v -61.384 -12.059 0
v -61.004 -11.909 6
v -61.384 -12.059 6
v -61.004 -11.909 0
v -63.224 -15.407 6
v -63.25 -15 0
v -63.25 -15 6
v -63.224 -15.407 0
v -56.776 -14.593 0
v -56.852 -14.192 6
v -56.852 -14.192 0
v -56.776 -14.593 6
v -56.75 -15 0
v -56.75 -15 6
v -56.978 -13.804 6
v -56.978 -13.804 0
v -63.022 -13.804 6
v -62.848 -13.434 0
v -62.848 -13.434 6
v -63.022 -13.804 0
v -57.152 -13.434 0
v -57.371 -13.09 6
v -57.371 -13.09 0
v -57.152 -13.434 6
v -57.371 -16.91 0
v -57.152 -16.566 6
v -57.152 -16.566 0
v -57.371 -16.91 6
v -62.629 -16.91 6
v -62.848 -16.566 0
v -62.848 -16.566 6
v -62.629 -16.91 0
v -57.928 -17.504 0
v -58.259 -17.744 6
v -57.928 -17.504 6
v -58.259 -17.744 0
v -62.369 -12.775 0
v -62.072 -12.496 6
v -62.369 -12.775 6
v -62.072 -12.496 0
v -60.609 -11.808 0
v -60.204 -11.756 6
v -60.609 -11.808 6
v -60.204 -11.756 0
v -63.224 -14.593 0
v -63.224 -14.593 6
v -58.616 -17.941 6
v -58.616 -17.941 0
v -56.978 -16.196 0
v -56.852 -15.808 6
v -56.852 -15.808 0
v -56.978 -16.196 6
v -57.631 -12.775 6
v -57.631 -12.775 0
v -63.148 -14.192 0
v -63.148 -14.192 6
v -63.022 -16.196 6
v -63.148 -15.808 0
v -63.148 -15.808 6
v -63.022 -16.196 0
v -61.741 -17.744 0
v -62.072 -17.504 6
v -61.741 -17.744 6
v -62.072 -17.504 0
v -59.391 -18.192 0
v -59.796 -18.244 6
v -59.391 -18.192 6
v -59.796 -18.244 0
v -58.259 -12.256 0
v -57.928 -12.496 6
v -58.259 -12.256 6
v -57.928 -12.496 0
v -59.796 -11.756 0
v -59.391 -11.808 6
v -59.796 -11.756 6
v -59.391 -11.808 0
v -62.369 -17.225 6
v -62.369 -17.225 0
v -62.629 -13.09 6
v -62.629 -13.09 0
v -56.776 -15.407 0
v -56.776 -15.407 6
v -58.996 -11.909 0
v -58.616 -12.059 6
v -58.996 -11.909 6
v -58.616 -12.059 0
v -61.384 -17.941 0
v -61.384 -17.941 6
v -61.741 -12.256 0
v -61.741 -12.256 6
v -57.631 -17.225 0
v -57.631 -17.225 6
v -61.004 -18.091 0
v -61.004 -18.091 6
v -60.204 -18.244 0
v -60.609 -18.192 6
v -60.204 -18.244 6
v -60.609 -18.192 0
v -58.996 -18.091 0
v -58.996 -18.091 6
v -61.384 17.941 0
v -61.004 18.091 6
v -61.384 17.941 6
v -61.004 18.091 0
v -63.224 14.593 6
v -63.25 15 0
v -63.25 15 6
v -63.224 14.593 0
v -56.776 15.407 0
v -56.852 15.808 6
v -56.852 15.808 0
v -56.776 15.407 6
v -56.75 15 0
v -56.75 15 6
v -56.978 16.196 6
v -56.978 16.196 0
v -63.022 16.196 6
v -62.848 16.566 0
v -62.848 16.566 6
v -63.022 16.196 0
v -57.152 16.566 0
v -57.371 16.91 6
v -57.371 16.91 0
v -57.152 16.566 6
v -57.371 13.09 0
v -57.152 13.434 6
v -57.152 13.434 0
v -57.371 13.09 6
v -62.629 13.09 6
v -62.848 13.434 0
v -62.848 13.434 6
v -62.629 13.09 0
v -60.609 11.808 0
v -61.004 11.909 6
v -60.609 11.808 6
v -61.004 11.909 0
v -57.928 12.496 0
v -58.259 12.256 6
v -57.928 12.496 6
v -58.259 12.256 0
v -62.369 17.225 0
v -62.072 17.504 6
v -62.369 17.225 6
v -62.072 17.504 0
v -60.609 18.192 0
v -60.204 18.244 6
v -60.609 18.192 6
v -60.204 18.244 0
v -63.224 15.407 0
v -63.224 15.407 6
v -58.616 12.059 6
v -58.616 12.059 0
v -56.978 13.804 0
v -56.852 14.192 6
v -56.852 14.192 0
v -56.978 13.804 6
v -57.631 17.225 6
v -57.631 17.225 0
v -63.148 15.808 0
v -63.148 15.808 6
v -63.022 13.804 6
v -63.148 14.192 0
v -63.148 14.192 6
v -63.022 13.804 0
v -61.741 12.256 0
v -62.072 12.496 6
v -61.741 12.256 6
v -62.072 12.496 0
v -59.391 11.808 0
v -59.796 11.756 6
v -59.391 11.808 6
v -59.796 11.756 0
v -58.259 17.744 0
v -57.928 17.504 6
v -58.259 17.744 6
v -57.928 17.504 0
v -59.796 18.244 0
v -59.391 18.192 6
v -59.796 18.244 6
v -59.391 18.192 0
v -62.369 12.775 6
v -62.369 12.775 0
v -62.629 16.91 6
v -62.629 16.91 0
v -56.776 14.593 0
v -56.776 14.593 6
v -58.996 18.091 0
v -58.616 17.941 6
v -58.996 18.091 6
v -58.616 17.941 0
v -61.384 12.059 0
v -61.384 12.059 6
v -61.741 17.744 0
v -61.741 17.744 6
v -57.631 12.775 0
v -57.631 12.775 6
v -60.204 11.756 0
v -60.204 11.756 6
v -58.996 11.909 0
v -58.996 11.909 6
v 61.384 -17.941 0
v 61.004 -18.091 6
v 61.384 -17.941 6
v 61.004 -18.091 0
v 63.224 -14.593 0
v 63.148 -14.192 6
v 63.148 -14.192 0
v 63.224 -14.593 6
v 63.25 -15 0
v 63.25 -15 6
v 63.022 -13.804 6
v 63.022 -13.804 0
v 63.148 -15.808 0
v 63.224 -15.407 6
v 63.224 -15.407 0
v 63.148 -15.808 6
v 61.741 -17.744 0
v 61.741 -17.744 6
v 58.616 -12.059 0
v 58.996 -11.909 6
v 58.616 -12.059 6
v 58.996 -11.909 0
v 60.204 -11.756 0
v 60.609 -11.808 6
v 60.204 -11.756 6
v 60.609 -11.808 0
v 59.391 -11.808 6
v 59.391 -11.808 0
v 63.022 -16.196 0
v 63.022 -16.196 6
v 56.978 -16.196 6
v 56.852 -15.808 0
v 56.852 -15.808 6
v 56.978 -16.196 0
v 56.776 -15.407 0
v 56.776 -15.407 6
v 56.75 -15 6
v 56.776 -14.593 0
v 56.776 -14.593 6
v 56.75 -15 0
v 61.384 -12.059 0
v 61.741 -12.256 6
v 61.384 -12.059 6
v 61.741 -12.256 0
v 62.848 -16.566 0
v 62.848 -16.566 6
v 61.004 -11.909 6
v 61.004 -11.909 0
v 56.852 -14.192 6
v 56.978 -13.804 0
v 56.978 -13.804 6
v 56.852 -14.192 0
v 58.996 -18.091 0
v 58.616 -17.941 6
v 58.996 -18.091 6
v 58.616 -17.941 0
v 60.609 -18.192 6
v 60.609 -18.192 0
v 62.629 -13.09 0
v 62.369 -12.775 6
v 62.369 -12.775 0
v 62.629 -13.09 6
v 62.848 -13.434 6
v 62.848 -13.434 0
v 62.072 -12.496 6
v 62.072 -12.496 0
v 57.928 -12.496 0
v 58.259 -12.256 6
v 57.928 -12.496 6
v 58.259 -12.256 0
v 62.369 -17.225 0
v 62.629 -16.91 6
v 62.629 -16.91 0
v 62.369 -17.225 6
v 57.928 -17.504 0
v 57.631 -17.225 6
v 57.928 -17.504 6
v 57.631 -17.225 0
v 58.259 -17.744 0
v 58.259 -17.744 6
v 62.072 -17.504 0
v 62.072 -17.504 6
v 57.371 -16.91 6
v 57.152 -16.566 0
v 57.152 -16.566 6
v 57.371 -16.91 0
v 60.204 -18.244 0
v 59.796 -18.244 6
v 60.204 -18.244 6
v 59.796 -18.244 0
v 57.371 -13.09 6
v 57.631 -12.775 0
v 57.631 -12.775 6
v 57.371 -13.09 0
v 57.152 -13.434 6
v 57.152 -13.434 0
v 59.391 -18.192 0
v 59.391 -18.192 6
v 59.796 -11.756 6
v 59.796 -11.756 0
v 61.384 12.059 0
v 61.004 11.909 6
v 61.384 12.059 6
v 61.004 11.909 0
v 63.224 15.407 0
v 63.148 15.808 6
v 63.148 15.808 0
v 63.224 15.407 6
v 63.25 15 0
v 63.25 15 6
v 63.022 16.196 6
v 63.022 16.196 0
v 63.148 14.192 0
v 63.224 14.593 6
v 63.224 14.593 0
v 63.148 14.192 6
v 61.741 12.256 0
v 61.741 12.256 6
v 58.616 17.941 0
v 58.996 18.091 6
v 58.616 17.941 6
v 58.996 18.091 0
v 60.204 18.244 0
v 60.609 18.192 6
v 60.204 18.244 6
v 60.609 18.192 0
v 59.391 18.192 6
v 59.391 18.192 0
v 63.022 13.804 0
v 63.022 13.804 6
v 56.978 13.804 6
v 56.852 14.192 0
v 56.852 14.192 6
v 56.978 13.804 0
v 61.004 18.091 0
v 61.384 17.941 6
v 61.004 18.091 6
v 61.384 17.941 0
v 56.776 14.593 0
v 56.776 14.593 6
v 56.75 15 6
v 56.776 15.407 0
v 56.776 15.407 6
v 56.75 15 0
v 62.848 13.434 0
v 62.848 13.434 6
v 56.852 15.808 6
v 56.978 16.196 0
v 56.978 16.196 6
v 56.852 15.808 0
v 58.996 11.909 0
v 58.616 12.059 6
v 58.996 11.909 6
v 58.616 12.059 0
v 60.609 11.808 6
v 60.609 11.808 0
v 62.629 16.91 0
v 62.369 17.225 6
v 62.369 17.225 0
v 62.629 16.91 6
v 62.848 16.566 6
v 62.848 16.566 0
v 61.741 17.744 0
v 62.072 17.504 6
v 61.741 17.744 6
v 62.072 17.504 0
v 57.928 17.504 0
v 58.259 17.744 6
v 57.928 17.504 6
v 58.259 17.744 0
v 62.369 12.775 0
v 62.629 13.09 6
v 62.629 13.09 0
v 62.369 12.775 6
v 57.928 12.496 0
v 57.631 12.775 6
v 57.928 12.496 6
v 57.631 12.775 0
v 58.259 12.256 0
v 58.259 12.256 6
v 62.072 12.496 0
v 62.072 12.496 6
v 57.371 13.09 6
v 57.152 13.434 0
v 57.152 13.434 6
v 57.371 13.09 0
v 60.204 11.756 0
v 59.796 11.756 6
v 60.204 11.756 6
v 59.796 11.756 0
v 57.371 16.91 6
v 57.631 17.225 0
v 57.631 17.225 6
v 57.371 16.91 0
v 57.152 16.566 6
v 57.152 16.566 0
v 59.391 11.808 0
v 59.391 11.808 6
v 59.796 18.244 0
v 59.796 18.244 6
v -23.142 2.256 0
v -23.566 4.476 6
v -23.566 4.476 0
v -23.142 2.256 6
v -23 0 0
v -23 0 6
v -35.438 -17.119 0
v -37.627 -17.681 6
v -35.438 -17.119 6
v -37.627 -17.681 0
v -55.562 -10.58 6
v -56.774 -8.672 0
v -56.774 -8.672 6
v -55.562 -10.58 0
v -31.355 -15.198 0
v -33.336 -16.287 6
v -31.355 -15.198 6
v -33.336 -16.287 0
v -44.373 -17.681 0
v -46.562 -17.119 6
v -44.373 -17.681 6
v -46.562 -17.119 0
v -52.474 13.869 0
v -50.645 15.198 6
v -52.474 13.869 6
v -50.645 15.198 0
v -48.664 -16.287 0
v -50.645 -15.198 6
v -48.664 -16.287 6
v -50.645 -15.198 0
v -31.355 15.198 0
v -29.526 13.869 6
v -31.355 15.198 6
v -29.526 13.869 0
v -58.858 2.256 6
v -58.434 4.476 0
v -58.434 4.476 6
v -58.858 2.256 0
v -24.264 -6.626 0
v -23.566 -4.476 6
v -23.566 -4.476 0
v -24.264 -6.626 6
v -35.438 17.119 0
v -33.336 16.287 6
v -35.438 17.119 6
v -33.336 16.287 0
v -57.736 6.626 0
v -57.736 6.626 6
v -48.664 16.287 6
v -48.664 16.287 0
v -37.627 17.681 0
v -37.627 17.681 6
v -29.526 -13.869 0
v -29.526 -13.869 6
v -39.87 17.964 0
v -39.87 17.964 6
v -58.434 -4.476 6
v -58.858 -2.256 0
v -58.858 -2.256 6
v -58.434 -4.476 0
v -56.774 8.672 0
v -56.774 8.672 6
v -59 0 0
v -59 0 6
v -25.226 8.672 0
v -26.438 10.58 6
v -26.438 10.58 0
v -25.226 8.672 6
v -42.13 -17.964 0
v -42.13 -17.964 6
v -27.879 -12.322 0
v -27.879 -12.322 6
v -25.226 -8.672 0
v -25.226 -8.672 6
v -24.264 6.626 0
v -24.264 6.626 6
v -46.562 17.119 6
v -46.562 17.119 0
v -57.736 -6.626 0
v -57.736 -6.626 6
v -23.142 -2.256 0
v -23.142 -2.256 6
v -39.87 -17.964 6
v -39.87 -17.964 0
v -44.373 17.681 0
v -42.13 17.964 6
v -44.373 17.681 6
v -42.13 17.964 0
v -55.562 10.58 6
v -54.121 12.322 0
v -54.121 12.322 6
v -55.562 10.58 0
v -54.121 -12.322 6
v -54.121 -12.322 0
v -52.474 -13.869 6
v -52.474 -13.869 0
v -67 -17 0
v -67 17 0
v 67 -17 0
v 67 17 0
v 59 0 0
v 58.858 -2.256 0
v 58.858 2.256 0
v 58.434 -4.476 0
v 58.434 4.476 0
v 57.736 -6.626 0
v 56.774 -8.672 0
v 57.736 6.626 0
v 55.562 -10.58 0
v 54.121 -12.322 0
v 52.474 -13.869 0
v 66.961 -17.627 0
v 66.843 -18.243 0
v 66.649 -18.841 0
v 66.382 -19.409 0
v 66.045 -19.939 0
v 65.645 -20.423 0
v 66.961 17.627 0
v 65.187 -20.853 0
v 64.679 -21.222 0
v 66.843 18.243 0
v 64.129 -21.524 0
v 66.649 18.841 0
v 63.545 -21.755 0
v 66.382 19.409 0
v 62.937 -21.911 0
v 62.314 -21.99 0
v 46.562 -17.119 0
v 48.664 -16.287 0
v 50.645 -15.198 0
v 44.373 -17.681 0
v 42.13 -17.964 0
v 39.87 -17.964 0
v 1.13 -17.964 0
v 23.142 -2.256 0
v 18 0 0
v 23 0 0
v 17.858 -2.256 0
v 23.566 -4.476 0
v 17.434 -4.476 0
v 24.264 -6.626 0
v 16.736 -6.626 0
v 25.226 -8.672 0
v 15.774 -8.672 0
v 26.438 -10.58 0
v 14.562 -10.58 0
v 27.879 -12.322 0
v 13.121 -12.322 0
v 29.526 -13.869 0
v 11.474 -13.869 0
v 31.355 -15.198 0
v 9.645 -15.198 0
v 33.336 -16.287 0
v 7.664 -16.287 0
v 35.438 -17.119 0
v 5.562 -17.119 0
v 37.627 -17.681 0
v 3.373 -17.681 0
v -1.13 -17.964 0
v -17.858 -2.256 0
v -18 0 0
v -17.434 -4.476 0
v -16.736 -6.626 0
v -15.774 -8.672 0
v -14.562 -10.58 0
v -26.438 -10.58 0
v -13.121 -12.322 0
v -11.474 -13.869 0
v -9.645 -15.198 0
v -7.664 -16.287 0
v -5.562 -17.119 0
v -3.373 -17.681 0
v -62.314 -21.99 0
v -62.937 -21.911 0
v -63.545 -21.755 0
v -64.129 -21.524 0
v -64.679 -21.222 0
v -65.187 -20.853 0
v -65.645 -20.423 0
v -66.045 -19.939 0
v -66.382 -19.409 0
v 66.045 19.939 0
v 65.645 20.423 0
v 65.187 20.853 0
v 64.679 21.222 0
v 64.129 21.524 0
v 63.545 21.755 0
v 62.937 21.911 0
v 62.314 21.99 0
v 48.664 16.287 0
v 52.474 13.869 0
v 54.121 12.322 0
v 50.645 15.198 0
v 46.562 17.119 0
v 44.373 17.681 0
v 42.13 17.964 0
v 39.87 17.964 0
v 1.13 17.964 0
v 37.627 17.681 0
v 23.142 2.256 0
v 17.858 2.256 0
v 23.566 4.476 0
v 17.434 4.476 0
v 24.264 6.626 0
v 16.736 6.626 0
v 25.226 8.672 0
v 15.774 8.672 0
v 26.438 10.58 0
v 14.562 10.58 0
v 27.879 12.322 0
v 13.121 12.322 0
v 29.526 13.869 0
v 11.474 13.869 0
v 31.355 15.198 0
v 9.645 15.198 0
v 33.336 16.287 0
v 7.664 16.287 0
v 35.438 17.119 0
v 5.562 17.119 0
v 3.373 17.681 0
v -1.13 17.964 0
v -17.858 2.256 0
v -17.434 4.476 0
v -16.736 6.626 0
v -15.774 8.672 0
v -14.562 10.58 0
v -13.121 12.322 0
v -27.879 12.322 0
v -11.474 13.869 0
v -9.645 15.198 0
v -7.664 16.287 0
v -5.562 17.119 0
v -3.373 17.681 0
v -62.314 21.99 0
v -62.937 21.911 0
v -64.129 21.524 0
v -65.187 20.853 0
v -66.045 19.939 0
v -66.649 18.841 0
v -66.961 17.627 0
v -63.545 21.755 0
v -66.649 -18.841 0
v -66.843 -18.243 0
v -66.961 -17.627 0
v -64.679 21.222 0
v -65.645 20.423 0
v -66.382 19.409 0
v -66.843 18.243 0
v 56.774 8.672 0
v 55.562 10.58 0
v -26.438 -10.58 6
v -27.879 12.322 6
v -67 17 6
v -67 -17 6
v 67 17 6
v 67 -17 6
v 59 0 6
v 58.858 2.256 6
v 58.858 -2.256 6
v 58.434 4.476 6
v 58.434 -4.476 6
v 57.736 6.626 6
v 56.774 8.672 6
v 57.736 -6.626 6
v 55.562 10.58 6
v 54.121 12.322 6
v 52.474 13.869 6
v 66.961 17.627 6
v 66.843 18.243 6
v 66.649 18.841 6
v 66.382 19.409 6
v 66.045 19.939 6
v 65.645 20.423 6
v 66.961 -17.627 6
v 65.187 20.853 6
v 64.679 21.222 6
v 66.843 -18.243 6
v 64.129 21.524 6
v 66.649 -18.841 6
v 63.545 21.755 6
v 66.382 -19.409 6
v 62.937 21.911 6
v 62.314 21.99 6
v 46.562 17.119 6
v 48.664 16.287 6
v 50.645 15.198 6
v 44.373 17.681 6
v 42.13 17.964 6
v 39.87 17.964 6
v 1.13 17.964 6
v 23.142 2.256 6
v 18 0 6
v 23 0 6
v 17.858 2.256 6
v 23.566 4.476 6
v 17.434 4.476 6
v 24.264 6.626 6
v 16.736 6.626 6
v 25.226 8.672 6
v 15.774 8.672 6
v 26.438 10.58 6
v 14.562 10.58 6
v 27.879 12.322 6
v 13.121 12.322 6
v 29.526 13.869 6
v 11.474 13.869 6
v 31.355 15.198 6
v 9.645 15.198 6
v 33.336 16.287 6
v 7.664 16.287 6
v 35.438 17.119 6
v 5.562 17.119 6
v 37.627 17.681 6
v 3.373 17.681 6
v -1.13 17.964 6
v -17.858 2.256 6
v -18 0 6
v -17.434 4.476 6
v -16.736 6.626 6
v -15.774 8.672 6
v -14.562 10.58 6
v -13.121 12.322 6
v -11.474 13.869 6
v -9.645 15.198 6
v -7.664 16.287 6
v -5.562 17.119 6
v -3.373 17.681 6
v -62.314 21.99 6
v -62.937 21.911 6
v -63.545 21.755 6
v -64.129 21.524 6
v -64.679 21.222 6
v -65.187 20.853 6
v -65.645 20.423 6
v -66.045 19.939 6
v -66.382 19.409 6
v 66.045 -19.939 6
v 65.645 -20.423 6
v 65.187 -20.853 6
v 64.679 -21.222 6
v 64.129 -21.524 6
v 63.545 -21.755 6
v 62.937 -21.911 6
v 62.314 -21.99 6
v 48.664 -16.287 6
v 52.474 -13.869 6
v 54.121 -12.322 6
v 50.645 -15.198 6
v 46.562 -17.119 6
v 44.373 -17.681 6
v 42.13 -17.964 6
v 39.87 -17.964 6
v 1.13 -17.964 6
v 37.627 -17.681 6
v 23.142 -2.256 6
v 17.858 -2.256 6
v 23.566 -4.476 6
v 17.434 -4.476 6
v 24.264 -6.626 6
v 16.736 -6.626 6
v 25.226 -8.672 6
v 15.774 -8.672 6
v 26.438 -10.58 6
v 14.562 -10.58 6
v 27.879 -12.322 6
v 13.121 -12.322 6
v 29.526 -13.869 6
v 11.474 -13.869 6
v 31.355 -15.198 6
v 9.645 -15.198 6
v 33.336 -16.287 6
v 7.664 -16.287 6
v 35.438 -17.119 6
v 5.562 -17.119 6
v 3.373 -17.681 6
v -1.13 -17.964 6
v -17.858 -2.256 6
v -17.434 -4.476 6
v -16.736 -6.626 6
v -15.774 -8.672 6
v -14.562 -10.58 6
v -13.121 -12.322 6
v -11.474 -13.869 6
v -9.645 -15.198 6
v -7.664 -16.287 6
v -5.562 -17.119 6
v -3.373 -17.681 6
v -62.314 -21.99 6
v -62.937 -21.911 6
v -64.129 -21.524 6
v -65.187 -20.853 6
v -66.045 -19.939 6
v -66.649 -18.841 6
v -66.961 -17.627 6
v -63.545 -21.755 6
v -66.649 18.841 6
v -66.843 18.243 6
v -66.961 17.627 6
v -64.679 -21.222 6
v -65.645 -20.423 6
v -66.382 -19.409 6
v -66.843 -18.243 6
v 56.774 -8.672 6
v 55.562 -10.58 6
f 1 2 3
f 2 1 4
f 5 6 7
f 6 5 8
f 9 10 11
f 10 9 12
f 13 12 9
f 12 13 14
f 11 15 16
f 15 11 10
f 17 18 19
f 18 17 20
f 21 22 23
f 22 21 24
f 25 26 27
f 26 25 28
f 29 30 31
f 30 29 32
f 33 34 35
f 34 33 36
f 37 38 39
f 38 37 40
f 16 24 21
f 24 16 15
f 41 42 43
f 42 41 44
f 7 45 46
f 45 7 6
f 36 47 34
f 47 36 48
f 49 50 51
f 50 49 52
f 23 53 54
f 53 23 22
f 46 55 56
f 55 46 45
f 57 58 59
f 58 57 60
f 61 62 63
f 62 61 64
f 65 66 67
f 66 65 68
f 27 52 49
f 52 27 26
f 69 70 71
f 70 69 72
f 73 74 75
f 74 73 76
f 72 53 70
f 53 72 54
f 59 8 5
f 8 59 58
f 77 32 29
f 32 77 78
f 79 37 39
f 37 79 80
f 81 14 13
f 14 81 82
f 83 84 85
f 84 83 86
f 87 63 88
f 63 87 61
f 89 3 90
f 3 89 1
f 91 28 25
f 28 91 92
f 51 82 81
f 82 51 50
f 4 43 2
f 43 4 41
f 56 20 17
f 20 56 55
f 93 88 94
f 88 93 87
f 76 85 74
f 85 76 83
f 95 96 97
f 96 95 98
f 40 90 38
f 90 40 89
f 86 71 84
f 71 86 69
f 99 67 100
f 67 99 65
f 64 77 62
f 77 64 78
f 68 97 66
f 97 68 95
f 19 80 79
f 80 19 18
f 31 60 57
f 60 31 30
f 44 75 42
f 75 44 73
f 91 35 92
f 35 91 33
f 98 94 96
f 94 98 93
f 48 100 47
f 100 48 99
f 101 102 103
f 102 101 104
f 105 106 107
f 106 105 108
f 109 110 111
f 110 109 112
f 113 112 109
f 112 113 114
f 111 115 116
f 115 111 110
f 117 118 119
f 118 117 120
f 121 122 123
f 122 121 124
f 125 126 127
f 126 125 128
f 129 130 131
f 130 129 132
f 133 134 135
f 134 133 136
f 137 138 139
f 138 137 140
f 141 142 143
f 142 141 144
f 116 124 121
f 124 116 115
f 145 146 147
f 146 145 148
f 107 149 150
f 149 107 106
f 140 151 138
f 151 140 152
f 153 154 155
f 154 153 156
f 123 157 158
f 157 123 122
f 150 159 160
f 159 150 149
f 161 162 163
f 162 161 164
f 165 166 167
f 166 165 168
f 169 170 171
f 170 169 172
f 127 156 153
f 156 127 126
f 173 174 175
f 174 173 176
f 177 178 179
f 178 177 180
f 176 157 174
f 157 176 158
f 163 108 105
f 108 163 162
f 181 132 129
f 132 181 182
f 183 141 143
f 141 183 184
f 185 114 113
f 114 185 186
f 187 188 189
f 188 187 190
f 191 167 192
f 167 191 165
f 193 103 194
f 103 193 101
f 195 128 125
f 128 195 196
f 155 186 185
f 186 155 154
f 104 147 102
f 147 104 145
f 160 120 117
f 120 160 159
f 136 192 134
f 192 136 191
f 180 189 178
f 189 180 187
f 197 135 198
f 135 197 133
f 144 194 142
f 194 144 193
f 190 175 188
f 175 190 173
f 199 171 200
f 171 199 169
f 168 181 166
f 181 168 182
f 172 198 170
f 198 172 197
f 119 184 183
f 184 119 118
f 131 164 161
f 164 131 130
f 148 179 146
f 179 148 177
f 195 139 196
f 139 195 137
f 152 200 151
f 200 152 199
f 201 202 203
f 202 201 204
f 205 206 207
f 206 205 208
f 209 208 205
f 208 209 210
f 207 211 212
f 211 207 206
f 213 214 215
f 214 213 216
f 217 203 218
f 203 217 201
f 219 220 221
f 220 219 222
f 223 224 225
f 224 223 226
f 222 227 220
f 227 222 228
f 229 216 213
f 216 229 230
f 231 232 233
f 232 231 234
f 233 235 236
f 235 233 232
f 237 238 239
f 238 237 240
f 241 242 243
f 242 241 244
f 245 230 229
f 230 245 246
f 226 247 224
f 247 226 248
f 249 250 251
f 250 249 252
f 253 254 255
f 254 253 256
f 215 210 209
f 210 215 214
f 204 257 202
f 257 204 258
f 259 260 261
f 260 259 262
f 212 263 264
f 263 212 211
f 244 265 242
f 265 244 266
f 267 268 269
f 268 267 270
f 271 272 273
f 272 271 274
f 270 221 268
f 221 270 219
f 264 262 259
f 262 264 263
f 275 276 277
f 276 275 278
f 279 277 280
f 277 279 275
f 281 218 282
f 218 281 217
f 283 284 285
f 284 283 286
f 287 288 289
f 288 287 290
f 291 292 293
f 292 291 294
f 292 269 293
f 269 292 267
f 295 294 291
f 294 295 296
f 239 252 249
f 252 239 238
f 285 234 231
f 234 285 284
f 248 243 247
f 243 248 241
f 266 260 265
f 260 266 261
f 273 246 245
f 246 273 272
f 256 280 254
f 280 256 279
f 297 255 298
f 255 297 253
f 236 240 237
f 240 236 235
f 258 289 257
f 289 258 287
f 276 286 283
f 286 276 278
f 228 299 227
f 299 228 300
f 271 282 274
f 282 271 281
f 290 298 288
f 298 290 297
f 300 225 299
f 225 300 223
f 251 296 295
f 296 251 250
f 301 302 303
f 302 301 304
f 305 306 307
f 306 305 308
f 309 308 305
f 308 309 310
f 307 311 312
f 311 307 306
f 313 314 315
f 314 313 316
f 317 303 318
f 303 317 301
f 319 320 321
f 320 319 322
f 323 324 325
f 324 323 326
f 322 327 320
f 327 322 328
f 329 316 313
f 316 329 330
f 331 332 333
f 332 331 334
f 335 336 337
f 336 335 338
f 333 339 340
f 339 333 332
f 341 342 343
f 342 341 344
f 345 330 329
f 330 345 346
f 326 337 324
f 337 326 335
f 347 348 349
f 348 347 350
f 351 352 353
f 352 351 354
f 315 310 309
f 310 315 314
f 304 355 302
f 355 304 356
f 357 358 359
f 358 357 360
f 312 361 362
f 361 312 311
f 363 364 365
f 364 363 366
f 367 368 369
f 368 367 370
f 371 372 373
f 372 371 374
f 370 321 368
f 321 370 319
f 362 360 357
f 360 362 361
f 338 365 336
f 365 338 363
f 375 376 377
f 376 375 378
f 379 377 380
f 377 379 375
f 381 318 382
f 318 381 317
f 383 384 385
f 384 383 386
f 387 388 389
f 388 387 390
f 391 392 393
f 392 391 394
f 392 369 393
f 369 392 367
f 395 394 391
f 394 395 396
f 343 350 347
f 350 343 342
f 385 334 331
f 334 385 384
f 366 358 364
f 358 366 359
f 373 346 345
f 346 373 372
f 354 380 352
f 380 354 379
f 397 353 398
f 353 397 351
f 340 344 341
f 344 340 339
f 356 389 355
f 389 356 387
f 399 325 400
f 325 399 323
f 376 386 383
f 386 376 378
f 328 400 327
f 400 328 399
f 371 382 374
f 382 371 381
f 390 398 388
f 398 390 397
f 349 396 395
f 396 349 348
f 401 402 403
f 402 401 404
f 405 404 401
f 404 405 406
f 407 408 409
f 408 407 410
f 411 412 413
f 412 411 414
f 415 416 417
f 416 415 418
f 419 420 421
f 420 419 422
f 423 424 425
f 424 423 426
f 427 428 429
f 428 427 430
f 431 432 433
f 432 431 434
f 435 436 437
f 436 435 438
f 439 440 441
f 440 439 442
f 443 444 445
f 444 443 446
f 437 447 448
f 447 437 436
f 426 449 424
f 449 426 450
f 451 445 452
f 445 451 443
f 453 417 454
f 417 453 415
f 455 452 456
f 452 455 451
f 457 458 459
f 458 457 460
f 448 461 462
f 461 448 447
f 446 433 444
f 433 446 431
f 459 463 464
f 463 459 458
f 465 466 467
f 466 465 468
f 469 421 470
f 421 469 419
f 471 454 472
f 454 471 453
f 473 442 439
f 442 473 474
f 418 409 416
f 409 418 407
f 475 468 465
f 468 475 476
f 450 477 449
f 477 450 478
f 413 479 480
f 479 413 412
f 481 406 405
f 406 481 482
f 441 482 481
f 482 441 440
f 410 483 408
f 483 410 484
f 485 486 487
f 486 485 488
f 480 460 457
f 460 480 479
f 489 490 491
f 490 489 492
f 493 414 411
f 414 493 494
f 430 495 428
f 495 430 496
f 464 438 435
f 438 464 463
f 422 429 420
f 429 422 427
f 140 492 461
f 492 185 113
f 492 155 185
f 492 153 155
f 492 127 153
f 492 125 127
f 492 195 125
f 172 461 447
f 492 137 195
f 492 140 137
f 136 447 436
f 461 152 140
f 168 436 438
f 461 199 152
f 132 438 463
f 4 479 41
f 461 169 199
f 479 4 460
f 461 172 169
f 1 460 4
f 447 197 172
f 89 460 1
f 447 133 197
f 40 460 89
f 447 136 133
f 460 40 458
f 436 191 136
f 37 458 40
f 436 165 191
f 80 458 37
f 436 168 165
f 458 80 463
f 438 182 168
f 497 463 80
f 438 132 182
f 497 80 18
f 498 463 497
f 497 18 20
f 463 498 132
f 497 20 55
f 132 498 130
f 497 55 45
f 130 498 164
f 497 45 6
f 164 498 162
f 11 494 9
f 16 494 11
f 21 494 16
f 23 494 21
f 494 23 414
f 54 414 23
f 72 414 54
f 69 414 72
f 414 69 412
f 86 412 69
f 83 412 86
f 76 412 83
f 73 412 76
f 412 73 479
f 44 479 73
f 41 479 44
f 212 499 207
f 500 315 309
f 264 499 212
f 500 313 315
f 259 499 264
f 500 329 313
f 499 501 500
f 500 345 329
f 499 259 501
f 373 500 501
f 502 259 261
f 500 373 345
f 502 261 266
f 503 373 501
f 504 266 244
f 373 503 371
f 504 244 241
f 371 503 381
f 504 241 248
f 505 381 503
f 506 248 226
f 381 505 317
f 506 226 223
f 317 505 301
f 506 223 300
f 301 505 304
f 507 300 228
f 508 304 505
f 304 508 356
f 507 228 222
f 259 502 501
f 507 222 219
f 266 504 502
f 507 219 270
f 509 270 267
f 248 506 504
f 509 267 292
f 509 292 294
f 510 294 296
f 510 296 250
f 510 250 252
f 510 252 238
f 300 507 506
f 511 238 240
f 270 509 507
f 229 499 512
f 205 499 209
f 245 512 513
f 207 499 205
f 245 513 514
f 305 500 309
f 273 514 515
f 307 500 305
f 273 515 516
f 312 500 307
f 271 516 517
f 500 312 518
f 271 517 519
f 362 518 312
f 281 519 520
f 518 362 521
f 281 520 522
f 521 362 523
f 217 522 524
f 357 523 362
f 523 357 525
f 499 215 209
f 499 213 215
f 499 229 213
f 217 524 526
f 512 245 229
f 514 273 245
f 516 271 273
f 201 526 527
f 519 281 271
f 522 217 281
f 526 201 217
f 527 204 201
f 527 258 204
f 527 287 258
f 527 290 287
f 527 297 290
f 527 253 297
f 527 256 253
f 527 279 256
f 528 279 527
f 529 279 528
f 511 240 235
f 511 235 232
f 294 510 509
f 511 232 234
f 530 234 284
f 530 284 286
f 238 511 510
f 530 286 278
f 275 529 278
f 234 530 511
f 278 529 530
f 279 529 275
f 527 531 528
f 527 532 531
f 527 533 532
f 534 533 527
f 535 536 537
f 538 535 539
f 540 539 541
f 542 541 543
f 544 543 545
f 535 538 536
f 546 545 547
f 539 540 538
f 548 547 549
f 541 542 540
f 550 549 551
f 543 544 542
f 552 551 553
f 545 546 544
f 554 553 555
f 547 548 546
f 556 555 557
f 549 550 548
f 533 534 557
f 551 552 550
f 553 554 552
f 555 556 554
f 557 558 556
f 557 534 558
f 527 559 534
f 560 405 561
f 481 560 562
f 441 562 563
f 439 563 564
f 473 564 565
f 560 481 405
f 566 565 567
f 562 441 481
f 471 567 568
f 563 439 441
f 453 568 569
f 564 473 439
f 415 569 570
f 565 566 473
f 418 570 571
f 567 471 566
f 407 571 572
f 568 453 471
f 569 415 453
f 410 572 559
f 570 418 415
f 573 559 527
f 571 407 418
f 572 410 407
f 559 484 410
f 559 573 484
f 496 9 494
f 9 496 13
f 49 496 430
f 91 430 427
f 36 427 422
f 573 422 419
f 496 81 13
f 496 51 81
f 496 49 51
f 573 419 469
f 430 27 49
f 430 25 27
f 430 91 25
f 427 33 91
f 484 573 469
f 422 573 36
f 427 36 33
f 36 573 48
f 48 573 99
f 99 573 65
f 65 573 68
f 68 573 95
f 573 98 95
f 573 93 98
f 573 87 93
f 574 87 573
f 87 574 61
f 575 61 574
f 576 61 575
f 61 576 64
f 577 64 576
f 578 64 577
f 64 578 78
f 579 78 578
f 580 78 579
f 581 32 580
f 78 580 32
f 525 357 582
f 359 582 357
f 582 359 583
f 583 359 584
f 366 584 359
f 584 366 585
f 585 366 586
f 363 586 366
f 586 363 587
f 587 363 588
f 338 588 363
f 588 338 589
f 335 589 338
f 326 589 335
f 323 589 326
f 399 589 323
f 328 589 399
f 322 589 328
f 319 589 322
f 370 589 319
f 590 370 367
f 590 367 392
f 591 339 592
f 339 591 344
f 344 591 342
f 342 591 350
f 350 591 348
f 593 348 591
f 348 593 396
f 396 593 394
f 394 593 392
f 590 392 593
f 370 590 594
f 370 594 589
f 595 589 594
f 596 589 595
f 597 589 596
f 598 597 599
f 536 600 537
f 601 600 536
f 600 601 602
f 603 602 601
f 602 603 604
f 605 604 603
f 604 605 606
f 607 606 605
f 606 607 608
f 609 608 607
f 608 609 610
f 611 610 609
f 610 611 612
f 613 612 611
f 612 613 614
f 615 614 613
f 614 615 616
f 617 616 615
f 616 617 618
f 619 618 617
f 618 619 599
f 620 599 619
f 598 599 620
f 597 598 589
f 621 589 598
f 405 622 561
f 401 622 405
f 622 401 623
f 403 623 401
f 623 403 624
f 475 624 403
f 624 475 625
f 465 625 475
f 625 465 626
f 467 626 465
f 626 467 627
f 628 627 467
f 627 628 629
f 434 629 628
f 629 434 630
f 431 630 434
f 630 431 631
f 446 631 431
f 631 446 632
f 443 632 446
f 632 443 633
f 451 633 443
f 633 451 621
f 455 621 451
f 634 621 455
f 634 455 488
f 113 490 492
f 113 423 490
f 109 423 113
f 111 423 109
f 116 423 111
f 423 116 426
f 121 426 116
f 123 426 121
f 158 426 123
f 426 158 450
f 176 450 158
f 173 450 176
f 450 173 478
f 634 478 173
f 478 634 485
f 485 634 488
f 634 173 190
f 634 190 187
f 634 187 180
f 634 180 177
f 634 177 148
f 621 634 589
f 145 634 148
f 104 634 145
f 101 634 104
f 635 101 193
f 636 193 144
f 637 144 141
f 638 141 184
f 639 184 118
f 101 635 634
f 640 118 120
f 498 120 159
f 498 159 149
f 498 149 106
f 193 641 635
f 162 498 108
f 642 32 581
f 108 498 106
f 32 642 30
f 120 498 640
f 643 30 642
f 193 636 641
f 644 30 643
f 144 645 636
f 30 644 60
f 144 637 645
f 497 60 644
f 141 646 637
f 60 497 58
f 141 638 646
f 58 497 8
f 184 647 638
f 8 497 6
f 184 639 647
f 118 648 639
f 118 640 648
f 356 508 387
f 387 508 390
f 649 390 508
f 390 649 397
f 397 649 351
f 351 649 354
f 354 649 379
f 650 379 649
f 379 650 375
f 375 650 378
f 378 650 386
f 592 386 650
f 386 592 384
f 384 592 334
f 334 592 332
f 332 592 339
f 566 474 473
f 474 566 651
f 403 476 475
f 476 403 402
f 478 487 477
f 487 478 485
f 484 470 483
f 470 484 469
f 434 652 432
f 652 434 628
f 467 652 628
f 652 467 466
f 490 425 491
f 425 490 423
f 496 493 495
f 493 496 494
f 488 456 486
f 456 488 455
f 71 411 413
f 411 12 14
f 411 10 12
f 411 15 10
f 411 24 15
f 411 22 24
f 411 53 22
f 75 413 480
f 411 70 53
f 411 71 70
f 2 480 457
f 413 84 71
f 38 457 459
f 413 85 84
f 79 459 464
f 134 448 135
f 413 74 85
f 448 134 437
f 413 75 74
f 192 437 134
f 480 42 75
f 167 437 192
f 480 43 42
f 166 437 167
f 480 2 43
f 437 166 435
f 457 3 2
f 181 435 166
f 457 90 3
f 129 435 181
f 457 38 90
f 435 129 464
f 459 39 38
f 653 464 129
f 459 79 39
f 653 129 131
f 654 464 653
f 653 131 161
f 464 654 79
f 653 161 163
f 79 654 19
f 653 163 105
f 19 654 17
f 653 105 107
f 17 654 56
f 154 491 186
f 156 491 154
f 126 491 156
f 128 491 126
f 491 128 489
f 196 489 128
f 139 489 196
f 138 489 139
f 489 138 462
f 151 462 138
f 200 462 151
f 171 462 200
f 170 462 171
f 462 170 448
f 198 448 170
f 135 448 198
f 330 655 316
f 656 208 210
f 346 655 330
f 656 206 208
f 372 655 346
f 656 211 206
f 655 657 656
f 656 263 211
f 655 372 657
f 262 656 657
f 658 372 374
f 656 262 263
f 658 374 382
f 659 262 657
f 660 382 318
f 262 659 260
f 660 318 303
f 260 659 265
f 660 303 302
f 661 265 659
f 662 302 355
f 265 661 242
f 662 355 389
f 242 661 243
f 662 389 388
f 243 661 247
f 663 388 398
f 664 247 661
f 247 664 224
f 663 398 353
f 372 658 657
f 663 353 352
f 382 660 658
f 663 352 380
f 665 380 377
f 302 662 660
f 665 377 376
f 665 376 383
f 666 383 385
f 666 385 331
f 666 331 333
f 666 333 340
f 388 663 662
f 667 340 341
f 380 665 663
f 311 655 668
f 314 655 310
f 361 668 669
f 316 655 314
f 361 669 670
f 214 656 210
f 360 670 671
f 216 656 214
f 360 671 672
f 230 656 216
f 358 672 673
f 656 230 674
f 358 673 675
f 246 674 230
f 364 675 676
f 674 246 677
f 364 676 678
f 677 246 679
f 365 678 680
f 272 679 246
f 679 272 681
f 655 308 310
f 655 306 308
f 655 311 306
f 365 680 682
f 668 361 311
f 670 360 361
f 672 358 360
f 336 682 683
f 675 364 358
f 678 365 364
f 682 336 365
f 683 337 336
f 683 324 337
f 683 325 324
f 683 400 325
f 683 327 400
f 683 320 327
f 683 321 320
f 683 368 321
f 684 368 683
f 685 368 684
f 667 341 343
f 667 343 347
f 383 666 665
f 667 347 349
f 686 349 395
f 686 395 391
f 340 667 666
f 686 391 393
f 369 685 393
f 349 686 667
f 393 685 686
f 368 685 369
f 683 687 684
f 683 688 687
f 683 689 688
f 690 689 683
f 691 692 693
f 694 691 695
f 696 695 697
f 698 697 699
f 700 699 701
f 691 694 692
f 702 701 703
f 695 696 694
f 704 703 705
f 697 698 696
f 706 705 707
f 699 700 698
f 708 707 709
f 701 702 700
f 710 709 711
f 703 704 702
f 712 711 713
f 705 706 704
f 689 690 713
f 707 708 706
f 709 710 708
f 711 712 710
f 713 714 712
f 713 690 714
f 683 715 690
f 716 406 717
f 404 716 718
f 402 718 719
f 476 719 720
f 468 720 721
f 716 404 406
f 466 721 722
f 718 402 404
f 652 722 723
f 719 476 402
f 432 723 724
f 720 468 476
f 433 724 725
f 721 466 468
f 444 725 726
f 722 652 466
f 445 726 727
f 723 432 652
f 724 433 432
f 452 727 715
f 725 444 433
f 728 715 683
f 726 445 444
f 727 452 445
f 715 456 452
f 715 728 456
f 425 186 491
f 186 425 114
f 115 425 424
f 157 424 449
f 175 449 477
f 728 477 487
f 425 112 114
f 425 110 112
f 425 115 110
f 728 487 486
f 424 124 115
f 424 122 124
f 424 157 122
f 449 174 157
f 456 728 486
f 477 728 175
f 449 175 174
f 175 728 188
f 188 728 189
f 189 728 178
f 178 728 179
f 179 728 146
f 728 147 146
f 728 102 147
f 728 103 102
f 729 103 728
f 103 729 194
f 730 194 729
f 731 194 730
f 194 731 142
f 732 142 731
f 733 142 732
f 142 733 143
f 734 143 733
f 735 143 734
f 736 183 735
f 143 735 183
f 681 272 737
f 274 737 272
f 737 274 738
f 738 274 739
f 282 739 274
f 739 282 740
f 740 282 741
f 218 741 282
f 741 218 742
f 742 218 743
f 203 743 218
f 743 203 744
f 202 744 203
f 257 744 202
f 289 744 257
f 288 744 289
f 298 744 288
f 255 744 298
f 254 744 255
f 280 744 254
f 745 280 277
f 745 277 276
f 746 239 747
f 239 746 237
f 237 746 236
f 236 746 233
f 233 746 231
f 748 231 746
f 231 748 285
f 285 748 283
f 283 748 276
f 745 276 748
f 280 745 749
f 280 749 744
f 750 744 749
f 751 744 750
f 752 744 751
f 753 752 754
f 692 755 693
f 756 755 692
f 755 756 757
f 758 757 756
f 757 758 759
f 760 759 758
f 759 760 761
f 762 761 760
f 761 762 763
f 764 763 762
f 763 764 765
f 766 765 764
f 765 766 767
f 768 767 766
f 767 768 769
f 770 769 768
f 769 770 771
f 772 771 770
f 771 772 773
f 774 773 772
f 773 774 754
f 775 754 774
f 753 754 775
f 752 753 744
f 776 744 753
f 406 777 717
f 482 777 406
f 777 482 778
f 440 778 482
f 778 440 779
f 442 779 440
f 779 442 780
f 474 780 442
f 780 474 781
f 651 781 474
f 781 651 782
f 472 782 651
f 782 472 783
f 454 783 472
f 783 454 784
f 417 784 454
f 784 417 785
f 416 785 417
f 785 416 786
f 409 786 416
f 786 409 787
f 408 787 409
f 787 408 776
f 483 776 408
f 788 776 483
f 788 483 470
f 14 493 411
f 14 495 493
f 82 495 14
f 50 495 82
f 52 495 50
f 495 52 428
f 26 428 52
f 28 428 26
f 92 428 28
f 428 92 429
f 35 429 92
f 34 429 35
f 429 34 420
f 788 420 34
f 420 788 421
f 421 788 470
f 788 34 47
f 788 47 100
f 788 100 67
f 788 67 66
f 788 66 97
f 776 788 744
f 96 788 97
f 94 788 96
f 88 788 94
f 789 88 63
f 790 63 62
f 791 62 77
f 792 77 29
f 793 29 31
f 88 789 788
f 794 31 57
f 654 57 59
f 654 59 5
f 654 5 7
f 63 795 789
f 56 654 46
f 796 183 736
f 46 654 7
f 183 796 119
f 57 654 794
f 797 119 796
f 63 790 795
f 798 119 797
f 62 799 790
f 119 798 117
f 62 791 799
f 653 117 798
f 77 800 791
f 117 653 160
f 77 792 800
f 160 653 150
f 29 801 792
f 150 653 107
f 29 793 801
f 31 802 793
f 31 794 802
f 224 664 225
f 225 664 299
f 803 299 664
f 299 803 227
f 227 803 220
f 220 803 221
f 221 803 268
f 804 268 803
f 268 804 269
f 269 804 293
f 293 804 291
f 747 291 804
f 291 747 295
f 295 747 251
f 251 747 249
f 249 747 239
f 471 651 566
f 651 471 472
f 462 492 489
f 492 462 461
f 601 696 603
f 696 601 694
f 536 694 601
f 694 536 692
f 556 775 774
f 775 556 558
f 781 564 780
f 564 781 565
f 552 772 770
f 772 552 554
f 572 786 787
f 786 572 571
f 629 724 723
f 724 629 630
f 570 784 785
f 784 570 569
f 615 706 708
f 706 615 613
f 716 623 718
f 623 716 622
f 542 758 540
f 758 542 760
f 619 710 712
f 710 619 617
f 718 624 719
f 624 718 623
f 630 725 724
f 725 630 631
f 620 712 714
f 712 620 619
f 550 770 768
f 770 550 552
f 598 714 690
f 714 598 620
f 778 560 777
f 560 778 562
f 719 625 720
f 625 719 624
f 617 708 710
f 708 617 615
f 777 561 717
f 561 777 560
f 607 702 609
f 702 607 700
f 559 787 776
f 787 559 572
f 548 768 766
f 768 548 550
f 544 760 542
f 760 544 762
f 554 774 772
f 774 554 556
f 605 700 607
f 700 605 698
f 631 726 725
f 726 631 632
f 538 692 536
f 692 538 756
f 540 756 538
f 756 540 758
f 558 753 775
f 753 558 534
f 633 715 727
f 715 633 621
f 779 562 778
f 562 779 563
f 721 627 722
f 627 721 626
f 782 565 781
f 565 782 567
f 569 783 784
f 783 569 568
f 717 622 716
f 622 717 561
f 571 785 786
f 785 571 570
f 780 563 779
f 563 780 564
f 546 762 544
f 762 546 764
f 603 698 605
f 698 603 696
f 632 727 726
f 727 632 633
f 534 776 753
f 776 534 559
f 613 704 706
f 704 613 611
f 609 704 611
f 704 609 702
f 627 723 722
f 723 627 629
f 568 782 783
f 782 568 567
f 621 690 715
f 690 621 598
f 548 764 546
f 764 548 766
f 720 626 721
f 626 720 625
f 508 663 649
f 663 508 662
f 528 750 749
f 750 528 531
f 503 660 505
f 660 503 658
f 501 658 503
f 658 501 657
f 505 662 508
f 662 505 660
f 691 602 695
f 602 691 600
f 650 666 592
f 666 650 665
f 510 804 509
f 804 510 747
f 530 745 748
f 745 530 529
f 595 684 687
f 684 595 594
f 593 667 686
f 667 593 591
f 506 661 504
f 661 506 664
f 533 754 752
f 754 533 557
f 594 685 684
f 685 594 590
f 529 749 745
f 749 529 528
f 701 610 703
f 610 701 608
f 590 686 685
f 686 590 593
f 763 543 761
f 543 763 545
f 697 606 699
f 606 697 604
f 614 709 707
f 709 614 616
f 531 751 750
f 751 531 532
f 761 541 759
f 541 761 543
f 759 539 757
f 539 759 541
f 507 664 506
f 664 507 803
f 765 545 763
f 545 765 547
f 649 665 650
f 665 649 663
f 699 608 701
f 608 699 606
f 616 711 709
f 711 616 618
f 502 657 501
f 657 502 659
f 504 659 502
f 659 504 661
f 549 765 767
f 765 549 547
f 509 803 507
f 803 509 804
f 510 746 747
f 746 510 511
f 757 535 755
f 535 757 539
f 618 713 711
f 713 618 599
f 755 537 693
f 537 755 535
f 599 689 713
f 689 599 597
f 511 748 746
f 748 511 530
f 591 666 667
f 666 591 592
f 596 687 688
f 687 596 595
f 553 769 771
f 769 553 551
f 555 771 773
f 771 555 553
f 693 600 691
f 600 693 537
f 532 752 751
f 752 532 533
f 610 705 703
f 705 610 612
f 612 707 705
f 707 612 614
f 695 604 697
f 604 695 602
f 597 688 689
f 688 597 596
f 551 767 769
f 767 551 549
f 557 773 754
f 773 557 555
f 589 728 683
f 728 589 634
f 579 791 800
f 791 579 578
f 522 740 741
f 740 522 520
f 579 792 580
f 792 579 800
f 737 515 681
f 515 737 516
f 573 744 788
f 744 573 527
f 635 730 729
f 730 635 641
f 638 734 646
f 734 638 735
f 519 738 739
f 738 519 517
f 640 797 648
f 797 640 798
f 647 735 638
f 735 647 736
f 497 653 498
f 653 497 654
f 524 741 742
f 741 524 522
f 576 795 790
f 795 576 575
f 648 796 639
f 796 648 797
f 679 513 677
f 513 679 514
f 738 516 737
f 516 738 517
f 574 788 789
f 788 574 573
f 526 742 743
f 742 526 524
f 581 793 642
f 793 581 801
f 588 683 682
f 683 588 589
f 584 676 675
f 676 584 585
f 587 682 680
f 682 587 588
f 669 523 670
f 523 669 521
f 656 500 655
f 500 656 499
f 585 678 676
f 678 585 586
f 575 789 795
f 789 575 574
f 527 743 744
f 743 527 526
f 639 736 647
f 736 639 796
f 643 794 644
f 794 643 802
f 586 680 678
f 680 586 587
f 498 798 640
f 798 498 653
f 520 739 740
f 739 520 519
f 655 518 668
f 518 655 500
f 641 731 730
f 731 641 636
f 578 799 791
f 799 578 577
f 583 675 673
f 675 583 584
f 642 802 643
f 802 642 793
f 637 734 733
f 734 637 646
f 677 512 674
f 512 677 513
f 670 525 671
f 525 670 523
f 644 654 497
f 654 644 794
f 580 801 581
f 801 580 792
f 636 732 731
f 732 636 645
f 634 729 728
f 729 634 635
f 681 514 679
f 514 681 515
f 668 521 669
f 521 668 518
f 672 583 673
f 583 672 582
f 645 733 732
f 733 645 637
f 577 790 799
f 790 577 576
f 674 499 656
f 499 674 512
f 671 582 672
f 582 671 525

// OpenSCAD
$fn = 50;

difference() {
	union() {
		hull() {
			translate(v = [-62.0, 17.0, 0]) {
				cylinder(h = 6, r = 5);
			}
			translate(v = [62.0, 17.0, 0]) {
				cylinder(h = 6, r = 5);
			}
			translate(v = [-62.0, -17.0, 0]) {
				cylinder(h = 6, r = 5);
			}
			translate(v = [62.0, -17.0, 0]) {
				cylinder(h = 6, r = 5);
			}
		}
	}
	union() {
		translate(v = [-60.0, -15.0, -100.0]) {
			cylinder(h = 200, r = 3.25);
		}
		translate(v = [-60.0, 15.0, -100.0]) {
			cylinder(h = 200, r = 3.25);
		}
		translate(v = [60.0, -15.0, -100.0]) {
			cylinder(h = 200, r = 3.25);
		}
		translate(v = [60.0, 15.0, -100.0]) {
			cylinder(h = 200, r = 3.25);
		}
		translate(v = [-60.0, -15.0, -100.0]) {
			cylinder(h = 200, r = 1.8);
		}
		translate(v = [-60.0, 15.0, -100.0]) {
			cylinder(h = 200, r = 1.8);
		}
		translate(v = [60.0, -15.0, -100.0]) {
			cylinder(h = 200, r = 1.8);
		}
		translate(v = [60.0, 15.0, -100.0]) {
			cylinder(h = 200, r = 1.8);
		}
		translate(v = [-41.0, 0, 0.0]) {
			cylinder(h = 6, r = 18.0);
		}
		cylinder(h = 6, r = 18.0);
		translate(v = [41.0, 0, 0.0]) {
			cylinder(h = 6, r = 18.0);
		}
	}
}
